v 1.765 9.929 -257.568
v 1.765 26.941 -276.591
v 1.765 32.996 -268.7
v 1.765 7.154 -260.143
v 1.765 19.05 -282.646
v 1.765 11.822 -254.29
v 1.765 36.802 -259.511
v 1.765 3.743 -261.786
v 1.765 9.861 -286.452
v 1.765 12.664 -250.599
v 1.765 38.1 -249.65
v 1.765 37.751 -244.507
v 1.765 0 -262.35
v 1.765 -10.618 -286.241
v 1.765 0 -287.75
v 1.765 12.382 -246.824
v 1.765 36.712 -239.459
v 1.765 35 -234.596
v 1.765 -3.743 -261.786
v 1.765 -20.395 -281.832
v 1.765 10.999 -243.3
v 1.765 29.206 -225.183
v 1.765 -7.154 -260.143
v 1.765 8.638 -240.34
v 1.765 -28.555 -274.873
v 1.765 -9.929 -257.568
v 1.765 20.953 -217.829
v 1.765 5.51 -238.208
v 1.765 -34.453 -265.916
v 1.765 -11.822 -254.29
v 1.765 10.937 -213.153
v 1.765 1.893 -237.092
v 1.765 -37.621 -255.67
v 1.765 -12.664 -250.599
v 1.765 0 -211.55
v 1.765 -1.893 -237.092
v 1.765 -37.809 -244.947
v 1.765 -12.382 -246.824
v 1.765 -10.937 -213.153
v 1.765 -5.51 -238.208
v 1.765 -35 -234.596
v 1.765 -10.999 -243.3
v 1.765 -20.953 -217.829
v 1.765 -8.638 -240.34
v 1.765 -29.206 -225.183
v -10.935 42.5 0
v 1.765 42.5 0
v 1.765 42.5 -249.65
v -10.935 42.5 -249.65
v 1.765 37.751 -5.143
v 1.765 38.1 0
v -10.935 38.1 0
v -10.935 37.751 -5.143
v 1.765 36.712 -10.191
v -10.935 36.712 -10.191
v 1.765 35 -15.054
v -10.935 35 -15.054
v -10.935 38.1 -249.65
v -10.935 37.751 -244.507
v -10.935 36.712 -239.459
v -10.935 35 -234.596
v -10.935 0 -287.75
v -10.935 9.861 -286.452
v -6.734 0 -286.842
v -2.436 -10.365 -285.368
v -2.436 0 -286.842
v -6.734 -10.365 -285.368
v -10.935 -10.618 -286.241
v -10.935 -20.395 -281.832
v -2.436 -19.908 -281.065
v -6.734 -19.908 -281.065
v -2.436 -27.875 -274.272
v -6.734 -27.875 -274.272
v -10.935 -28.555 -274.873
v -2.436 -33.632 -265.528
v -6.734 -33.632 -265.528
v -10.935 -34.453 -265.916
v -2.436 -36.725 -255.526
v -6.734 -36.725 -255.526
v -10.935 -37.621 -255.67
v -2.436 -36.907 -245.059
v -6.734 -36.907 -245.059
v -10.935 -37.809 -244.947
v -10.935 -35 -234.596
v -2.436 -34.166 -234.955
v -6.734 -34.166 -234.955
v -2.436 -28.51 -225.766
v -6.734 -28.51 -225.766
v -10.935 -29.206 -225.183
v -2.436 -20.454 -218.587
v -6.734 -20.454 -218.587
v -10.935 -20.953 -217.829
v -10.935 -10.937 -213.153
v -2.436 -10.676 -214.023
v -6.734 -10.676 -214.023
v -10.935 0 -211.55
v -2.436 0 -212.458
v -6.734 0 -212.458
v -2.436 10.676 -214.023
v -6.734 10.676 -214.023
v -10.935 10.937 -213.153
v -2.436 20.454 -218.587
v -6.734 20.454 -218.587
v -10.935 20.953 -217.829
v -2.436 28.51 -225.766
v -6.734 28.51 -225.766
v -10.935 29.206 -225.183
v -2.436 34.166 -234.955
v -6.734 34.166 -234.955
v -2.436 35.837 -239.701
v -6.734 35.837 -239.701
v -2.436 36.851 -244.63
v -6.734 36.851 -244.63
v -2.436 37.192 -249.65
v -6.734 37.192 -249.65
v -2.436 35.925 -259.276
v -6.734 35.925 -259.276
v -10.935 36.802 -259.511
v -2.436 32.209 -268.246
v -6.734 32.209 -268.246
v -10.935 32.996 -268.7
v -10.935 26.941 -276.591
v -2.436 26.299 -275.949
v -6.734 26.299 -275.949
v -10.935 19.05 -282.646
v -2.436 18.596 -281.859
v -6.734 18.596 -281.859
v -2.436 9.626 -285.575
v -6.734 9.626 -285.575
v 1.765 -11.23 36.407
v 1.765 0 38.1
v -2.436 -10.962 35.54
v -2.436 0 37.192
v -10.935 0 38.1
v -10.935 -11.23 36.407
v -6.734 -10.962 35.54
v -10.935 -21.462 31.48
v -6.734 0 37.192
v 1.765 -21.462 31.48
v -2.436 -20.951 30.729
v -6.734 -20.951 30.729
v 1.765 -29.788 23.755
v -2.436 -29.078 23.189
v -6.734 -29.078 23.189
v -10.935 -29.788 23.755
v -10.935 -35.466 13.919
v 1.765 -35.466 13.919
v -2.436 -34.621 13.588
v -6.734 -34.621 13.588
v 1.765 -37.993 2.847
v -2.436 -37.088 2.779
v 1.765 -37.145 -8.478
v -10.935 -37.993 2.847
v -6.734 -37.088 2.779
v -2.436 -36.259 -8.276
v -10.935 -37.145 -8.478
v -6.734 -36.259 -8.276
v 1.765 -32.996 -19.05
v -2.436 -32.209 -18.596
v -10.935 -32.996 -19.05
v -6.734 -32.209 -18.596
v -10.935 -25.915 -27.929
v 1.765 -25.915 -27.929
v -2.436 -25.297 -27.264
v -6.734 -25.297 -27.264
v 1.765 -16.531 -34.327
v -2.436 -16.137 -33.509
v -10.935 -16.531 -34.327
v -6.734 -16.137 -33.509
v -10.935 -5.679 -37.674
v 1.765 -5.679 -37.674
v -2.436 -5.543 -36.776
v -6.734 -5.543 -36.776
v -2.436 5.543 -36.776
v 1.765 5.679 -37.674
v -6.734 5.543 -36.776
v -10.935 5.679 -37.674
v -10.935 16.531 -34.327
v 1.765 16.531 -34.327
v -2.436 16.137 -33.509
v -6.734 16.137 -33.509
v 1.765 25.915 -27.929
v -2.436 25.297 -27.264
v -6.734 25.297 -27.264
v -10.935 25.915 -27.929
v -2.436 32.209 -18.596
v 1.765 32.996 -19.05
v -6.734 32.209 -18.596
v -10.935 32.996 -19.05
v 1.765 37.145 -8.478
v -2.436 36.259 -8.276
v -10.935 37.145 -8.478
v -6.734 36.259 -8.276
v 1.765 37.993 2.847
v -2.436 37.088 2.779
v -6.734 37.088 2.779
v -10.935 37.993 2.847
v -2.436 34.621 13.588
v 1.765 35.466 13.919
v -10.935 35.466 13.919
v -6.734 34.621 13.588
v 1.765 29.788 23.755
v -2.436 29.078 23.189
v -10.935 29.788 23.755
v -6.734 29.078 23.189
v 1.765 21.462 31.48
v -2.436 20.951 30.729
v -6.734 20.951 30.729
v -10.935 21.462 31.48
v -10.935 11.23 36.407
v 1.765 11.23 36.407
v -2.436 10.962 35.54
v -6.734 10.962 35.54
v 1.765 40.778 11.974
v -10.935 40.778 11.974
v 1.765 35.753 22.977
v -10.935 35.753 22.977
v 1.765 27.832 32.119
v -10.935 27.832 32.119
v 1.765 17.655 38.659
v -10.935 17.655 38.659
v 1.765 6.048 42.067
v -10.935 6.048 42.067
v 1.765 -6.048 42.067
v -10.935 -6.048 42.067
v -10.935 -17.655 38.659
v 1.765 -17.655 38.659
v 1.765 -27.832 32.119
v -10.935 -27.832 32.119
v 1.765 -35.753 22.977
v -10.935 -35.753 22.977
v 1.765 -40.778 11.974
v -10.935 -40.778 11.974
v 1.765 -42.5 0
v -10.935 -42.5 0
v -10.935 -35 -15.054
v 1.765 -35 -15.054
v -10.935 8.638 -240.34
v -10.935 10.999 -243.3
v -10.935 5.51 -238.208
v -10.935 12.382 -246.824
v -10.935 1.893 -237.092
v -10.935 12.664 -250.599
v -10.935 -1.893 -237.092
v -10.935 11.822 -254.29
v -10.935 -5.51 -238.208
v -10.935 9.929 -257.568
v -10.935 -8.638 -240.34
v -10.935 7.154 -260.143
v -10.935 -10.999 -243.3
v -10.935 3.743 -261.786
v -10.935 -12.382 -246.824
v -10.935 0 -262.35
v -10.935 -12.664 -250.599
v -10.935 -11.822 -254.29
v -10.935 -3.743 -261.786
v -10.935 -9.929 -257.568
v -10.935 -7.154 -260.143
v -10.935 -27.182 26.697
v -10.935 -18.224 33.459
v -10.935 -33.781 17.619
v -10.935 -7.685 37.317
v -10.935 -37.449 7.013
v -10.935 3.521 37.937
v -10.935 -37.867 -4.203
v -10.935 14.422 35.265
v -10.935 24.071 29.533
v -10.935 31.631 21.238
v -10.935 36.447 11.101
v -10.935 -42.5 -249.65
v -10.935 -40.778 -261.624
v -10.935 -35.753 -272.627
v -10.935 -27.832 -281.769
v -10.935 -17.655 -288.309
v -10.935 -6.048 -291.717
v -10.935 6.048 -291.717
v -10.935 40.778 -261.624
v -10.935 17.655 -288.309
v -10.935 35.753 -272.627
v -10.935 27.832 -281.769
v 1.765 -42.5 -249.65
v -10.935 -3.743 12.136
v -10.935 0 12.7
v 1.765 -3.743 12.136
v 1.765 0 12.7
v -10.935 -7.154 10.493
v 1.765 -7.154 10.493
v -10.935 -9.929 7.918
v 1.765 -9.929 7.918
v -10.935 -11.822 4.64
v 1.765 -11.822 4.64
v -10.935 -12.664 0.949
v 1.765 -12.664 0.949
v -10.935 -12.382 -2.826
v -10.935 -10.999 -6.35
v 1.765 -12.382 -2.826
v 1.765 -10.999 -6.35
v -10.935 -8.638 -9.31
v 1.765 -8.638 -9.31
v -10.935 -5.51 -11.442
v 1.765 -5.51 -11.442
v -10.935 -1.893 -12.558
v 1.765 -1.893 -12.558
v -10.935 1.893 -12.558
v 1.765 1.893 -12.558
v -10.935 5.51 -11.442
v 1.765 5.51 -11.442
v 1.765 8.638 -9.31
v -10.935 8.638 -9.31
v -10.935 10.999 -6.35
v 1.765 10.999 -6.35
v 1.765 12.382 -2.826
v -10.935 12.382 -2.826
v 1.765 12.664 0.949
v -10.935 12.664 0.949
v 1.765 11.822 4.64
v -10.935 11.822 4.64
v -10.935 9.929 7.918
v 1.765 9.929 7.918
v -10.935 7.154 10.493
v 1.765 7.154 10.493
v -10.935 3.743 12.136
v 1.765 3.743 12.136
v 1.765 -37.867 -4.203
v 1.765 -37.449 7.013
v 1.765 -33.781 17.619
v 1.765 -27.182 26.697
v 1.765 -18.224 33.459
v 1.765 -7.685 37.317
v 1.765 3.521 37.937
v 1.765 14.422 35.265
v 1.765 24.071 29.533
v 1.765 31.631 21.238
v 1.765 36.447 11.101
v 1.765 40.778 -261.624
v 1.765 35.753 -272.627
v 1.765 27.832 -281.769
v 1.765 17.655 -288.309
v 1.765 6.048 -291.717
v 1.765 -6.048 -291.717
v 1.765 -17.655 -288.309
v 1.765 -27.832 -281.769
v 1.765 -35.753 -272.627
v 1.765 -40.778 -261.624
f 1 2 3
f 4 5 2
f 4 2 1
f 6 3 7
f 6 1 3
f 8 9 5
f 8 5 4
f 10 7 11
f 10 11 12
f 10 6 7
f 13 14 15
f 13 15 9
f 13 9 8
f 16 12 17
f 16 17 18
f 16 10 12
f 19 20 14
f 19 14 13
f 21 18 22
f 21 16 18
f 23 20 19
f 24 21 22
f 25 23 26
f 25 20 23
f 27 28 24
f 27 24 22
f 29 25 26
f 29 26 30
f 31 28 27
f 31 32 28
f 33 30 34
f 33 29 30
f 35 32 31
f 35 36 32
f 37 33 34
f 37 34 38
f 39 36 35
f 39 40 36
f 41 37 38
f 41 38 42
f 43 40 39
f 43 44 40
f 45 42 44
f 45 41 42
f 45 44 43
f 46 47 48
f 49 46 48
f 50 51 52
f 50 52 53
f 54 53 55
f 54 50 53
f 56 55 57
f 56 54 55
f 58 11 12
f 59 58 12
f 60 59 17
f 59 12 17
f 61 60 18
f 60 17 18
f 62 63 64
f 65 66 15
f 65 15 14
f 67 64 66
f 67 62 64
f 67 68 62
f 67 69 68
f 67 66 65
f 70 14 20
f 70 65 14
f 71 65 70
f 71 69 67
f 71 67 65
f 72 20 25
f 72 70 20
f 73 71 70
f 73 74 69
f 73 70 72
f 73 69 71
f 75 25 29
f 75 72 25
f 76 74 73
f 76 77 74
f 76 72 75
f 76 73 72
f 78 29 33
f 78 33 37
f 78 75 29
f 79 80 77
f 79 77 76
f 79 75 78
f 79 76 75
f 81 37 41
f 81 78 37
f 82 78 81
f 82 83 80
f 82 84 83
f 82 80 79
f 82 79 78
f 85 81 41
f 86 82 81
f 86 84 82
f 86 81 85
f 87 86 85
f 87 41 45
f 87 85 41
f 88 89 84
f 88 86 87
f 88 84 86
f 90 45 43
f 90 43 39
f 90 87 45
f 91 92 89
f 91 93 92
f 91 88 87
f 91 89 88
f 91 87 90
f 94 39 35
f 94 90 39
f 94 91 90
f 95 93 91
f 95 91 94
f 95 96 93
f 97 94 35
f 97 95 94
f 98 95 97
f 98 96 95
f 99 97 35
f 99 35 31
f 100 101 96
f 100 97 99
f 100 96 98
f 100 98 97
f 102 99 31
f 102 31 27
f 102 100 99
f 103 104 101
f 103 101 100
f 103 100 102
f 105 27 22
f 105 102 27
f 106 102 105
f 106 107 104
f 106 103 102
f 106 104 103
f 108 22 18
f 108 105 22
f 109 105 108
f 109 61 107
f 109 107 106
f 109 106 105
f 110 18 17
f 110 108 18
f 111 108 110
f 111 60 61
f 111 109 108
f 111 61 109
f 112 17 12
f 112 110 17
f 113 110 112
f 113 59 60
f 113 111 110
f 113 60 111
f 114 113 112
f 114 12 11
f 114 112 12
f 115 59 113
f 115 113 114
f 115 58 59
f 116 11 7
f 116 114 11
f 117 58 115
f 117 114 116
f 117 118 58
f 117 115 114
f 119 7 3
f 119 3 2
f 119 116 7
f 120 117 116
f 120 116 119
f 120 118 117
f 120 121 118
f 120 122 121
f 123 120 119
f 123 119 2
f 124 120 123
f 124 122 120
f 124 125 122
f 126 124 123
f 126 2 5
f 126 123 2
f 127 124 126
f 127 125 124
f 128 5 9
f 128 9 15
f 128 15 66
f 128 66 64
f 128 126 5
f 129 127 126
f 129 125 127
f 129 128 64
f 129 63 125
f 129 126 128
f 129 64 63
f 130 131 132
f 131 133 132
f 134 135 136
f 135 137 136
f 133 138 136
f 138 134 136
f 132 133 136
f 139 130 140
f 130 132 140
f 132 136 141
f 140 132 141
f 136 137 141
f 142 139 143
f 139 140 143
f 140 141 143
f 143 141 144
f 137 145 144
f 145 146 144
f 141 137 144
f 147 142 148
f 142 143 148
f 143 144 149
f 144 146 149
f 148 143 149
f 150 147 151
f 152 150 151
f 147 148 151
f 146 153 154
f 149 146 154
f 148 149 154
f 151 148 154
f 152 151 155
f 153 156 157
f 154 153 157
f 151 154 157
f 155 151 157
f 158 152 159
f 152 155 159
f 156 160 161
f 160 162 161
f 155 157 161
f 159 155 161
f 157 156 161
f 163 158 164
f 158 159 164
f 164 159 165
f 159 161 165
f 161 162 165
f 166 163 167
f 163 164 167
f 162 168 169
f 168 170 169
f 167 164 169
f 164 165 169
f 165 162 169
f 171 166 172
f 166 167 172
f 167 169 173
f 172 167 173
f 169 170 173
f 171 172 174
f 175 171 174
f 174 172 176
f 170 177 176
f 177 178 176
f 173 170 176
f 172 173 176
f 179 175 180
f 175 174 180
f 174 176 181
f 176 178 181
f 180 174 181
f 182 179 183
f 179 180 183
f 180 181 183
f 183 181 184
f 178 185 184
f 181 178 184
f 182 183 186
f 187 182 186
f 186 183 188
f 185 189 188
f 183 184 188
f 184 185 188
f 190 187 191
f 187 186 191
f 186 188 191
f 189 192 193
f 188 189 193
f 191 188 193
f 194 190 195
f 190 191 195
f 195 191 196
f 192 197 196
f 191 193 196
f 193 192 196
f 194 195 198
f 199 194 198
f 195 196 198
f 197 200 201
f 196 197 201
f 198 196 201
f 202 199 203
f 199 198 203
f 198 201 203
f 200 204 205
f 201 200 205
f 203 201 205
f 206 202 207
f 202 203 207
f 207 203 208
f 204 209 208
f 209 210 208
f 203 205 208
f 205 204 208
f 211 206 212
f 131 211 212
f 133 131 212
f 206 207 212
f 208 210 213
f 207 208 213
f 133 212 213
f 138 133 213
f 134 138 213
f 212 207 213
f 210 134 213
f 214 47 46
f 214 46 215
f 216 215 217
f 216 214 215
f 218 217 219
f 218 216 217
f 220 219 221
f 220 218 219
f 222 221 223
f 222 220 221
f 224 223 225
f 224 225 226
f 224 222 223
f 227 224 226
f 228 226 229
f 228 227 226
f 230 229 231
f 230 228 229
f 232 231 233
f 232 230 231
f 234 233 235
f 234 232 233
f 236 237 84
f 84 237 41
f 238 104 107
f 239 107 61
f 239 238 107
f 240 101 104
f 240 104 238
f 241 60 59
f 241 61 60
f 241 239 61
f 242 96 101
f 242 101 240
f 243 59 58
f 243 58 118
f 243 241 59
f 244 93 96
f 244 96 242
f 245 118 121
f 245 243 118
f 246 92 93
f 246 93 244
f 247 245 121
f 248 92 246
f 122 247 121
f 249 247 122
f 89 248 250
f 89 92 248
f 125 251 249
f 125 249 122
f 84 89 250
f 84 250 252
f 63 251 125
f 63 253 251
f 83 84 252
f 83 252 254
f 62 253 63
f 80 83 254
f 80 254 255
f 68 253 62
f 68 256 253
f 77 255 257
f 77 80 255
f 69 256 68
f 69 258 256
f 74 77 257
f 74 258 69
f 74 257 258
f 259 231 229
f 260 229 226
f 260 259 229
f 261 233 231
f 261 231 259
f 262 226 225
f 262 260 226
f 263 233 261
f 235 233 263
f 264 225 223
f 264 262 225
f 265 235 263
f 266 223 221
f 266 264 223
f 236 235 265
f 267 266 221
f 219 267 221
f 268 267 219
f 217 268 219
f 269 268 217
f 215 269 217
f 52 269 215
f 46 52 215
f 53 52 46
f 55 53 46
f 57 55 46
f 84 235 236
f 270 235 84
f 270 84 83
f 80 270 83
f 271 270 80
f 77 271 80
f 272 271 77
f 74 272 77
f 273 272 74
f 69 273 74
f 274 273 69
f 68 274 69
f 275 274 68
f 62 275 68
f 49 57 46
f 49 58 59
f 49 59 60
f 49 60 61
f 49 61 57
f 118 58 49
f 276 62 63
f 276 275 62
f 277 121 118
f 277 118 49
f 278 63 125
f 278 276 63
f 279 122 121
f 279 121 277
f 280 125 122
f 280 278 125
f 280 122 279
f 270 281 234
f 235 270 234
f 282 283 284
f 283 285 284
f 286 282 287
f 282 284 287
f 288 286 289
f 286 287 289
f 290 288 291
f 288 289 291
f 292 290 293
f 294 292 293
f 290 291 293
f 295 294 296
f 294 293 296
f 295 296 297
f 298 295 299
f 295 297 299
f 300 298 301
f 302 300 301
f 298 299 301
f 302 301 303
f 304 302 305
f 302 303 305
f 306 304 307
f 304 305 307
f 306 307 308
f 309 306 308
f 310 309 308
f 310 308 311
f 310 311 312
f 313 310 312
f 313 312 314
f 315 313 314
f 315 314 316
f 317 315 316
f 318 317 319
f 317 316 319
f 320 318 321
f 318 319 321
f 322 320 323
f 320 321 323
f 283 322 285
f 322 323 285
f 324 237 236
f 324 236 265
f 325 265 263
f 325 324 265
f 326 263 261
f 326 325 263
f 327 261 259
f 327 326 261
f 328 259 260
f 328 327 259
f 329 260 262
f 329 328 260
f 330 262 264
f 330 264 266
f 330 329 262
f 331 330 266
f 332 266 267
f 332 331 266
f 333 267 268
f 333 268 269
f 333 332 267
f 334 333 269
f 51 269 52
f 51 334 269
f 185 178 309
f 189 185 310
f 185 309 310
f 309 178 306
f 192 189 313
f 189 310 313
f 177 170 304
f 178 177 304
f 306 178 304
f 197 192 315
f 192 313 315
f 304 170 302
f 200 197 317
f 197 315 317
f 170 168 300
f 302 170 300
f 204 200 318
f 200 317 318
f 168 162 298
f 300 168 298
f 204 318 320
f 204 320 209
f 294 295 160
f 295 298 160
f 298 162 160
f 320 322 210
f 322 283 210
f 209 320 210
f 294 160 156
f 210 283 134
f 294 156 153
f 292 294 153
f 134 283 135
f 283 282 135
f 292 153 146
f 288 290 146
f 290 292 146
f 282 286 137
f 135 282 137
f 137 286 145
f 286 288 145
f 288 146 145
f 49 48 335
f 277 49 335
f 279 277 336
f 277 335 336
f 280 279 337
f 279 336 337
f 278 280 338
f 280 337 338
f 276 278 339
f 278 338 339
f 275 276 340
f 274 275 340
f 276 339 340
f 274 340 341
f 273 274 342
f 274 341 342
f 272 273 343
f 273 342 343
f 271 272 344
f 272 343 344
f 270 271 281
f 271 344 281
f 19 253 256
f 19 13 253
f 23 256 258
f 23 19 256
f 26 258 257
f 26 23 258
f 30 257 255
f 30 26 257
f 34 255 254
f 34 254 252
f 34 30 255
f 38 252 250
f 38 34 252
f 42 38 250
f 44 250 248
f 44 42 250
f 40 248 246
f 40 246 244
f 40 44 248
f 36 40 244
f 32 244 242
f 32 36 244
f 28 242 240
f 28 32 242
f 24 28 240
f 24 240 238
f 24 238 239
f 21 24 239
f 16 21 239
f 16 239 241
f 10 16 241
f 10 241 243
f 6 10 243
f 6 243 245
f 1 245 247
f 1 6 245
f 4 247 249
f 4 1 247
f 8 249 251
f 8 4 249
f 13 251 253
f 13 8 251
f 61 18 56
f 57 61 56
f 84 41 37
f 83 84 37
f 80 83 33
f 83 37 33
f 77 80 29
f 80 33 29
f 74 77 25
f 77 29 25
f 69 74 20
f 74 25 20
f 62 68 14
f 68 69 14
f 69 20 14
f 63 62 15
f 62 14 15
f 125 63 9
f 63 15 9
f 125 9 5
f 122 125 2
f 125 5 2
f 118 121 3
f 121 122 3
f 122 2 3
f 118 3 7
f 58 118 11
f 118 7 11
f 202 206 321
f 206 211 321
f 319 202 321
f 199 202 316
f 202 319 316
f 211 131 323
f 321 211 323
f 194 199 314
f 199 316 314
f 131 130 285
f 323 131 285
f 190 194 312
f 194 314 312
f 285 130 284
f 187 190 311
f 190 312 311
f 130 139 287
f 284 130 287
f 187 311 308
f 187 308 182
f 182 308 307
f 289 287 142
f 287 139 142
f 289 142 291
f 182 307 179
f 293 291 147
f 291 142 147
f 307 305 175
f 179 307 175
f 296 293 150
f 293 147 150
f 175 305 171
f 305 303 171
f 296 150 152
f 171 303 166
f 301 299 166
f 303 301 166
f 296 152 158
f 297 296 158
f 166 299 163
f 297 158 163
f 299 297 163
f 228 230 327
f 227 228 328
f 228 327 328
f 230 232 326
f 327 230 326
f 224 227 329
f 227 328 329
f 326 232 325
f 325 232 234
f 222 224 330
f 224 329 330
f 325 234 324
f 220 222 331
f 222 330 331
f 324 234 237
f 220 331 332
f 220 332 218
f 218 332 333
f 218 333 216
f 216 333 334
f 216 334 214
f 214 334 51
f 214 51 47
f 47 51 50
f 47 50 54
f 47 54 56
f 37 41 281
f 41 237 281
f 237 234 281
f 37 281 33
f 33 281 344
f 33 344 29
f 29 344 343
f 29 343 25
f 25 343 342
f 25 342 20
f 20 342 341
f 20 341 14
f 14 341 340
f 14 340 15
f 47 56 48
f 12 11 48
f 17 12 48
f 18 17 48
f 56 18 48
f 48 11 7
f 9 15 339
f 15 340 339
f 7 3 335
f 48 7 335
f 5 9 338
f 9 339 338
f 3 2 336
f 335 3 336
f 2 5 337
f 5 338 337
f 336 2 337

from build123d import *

# Parameters (mm, degrees)
F5_DEPTH = 12.7


with BuildPart() as f1:
    # F0 (on Front) → F1 (revolve)
    with BuildSketch(Plane.XZ):
        with BuildLine():
            Line((-10.9352547455, 38.1), (-10.9352547455, 12.7))
            Line((-10.9352547455, 12.7), (1.7647452545, 12.7))
            Line((1.7647452545, 12.7), (1.7647452545, 38.1))
            ThreePointArc((1.7647452545, 38.1), (-4.5852547455, 37.0773625405), (-10.9352547455, 38.1))
        make_face()
    revolve(axis=Axis((-4.5852547455, 0, 0), (1, 0, 0)))


with BuildPart() as f3_1:
    # F3: instance of F1
    add(f1.part.mirror(Plane.XY.offset(-124.825)))



with BuildPart() as f5:
    # F4 (on face) → F5 (new body, through all)
    with BuildSketch(Plane.YZ.offset(1.7647452545)):
        with BuildLine():
            Line((-35, -124.825), (-35, -24.1091269025))
            ThreePointArc((-35, -24.1091269025), (-40.5817077019, -12.624381173), (-42.5, 0))
            Line((-42.5, 0), (-42.5, -124.825))
            Line((-42.5, -124.825), (-35, -124.825))
        make_face()
        with BuildLine():
            ThreePointArc((42.5, 0), (40.5817077019, -12.624381173), (35, -24.1091269025))
            Line((35, -24.1091269025), (35, -124.825))
            Line((35, -124.825), (42.5, -124.825))
            Line((42.5, -124.825), (42.5, 0))
        make_face()
        with BuildLine():
            ThreePointArc((38.1, 0), (37.3169532518, -7.6847251089), (35, -15.0535710049))
            Line((35, -15.0535710049), (35, -24.1091269025))
            ThreePointArc((35, -24.1091269025), (40.5817077019, -12.624381173), (42.5, 0))
            ThreePointArc((42.5, 0), (0, 42.5), (-42.5, 0))
            ThreePointArc((-42.5, 0), (-40.5817077019, -12.624381173), (-35, -24.1091269025))
            Line((-35, -24.1091269025), (-35, -15.0535710049))
            ThreePointArc((-35, -15.0535710049), (-7.6847251089, 37.3169532518), (38.1, 0))
        make_face()
    extrude(amount=-F5_DEPTH)


with BuildPart() as f3_1_1:
    add(f3_1.part)

    add(f5.part)  # F6 merges F5
    # F6: F5 across plane
    add(f5.part.mirror(Plane.XY.offset(-124.825)))


solid = Compound([f1.part, f3_1_1.part])
